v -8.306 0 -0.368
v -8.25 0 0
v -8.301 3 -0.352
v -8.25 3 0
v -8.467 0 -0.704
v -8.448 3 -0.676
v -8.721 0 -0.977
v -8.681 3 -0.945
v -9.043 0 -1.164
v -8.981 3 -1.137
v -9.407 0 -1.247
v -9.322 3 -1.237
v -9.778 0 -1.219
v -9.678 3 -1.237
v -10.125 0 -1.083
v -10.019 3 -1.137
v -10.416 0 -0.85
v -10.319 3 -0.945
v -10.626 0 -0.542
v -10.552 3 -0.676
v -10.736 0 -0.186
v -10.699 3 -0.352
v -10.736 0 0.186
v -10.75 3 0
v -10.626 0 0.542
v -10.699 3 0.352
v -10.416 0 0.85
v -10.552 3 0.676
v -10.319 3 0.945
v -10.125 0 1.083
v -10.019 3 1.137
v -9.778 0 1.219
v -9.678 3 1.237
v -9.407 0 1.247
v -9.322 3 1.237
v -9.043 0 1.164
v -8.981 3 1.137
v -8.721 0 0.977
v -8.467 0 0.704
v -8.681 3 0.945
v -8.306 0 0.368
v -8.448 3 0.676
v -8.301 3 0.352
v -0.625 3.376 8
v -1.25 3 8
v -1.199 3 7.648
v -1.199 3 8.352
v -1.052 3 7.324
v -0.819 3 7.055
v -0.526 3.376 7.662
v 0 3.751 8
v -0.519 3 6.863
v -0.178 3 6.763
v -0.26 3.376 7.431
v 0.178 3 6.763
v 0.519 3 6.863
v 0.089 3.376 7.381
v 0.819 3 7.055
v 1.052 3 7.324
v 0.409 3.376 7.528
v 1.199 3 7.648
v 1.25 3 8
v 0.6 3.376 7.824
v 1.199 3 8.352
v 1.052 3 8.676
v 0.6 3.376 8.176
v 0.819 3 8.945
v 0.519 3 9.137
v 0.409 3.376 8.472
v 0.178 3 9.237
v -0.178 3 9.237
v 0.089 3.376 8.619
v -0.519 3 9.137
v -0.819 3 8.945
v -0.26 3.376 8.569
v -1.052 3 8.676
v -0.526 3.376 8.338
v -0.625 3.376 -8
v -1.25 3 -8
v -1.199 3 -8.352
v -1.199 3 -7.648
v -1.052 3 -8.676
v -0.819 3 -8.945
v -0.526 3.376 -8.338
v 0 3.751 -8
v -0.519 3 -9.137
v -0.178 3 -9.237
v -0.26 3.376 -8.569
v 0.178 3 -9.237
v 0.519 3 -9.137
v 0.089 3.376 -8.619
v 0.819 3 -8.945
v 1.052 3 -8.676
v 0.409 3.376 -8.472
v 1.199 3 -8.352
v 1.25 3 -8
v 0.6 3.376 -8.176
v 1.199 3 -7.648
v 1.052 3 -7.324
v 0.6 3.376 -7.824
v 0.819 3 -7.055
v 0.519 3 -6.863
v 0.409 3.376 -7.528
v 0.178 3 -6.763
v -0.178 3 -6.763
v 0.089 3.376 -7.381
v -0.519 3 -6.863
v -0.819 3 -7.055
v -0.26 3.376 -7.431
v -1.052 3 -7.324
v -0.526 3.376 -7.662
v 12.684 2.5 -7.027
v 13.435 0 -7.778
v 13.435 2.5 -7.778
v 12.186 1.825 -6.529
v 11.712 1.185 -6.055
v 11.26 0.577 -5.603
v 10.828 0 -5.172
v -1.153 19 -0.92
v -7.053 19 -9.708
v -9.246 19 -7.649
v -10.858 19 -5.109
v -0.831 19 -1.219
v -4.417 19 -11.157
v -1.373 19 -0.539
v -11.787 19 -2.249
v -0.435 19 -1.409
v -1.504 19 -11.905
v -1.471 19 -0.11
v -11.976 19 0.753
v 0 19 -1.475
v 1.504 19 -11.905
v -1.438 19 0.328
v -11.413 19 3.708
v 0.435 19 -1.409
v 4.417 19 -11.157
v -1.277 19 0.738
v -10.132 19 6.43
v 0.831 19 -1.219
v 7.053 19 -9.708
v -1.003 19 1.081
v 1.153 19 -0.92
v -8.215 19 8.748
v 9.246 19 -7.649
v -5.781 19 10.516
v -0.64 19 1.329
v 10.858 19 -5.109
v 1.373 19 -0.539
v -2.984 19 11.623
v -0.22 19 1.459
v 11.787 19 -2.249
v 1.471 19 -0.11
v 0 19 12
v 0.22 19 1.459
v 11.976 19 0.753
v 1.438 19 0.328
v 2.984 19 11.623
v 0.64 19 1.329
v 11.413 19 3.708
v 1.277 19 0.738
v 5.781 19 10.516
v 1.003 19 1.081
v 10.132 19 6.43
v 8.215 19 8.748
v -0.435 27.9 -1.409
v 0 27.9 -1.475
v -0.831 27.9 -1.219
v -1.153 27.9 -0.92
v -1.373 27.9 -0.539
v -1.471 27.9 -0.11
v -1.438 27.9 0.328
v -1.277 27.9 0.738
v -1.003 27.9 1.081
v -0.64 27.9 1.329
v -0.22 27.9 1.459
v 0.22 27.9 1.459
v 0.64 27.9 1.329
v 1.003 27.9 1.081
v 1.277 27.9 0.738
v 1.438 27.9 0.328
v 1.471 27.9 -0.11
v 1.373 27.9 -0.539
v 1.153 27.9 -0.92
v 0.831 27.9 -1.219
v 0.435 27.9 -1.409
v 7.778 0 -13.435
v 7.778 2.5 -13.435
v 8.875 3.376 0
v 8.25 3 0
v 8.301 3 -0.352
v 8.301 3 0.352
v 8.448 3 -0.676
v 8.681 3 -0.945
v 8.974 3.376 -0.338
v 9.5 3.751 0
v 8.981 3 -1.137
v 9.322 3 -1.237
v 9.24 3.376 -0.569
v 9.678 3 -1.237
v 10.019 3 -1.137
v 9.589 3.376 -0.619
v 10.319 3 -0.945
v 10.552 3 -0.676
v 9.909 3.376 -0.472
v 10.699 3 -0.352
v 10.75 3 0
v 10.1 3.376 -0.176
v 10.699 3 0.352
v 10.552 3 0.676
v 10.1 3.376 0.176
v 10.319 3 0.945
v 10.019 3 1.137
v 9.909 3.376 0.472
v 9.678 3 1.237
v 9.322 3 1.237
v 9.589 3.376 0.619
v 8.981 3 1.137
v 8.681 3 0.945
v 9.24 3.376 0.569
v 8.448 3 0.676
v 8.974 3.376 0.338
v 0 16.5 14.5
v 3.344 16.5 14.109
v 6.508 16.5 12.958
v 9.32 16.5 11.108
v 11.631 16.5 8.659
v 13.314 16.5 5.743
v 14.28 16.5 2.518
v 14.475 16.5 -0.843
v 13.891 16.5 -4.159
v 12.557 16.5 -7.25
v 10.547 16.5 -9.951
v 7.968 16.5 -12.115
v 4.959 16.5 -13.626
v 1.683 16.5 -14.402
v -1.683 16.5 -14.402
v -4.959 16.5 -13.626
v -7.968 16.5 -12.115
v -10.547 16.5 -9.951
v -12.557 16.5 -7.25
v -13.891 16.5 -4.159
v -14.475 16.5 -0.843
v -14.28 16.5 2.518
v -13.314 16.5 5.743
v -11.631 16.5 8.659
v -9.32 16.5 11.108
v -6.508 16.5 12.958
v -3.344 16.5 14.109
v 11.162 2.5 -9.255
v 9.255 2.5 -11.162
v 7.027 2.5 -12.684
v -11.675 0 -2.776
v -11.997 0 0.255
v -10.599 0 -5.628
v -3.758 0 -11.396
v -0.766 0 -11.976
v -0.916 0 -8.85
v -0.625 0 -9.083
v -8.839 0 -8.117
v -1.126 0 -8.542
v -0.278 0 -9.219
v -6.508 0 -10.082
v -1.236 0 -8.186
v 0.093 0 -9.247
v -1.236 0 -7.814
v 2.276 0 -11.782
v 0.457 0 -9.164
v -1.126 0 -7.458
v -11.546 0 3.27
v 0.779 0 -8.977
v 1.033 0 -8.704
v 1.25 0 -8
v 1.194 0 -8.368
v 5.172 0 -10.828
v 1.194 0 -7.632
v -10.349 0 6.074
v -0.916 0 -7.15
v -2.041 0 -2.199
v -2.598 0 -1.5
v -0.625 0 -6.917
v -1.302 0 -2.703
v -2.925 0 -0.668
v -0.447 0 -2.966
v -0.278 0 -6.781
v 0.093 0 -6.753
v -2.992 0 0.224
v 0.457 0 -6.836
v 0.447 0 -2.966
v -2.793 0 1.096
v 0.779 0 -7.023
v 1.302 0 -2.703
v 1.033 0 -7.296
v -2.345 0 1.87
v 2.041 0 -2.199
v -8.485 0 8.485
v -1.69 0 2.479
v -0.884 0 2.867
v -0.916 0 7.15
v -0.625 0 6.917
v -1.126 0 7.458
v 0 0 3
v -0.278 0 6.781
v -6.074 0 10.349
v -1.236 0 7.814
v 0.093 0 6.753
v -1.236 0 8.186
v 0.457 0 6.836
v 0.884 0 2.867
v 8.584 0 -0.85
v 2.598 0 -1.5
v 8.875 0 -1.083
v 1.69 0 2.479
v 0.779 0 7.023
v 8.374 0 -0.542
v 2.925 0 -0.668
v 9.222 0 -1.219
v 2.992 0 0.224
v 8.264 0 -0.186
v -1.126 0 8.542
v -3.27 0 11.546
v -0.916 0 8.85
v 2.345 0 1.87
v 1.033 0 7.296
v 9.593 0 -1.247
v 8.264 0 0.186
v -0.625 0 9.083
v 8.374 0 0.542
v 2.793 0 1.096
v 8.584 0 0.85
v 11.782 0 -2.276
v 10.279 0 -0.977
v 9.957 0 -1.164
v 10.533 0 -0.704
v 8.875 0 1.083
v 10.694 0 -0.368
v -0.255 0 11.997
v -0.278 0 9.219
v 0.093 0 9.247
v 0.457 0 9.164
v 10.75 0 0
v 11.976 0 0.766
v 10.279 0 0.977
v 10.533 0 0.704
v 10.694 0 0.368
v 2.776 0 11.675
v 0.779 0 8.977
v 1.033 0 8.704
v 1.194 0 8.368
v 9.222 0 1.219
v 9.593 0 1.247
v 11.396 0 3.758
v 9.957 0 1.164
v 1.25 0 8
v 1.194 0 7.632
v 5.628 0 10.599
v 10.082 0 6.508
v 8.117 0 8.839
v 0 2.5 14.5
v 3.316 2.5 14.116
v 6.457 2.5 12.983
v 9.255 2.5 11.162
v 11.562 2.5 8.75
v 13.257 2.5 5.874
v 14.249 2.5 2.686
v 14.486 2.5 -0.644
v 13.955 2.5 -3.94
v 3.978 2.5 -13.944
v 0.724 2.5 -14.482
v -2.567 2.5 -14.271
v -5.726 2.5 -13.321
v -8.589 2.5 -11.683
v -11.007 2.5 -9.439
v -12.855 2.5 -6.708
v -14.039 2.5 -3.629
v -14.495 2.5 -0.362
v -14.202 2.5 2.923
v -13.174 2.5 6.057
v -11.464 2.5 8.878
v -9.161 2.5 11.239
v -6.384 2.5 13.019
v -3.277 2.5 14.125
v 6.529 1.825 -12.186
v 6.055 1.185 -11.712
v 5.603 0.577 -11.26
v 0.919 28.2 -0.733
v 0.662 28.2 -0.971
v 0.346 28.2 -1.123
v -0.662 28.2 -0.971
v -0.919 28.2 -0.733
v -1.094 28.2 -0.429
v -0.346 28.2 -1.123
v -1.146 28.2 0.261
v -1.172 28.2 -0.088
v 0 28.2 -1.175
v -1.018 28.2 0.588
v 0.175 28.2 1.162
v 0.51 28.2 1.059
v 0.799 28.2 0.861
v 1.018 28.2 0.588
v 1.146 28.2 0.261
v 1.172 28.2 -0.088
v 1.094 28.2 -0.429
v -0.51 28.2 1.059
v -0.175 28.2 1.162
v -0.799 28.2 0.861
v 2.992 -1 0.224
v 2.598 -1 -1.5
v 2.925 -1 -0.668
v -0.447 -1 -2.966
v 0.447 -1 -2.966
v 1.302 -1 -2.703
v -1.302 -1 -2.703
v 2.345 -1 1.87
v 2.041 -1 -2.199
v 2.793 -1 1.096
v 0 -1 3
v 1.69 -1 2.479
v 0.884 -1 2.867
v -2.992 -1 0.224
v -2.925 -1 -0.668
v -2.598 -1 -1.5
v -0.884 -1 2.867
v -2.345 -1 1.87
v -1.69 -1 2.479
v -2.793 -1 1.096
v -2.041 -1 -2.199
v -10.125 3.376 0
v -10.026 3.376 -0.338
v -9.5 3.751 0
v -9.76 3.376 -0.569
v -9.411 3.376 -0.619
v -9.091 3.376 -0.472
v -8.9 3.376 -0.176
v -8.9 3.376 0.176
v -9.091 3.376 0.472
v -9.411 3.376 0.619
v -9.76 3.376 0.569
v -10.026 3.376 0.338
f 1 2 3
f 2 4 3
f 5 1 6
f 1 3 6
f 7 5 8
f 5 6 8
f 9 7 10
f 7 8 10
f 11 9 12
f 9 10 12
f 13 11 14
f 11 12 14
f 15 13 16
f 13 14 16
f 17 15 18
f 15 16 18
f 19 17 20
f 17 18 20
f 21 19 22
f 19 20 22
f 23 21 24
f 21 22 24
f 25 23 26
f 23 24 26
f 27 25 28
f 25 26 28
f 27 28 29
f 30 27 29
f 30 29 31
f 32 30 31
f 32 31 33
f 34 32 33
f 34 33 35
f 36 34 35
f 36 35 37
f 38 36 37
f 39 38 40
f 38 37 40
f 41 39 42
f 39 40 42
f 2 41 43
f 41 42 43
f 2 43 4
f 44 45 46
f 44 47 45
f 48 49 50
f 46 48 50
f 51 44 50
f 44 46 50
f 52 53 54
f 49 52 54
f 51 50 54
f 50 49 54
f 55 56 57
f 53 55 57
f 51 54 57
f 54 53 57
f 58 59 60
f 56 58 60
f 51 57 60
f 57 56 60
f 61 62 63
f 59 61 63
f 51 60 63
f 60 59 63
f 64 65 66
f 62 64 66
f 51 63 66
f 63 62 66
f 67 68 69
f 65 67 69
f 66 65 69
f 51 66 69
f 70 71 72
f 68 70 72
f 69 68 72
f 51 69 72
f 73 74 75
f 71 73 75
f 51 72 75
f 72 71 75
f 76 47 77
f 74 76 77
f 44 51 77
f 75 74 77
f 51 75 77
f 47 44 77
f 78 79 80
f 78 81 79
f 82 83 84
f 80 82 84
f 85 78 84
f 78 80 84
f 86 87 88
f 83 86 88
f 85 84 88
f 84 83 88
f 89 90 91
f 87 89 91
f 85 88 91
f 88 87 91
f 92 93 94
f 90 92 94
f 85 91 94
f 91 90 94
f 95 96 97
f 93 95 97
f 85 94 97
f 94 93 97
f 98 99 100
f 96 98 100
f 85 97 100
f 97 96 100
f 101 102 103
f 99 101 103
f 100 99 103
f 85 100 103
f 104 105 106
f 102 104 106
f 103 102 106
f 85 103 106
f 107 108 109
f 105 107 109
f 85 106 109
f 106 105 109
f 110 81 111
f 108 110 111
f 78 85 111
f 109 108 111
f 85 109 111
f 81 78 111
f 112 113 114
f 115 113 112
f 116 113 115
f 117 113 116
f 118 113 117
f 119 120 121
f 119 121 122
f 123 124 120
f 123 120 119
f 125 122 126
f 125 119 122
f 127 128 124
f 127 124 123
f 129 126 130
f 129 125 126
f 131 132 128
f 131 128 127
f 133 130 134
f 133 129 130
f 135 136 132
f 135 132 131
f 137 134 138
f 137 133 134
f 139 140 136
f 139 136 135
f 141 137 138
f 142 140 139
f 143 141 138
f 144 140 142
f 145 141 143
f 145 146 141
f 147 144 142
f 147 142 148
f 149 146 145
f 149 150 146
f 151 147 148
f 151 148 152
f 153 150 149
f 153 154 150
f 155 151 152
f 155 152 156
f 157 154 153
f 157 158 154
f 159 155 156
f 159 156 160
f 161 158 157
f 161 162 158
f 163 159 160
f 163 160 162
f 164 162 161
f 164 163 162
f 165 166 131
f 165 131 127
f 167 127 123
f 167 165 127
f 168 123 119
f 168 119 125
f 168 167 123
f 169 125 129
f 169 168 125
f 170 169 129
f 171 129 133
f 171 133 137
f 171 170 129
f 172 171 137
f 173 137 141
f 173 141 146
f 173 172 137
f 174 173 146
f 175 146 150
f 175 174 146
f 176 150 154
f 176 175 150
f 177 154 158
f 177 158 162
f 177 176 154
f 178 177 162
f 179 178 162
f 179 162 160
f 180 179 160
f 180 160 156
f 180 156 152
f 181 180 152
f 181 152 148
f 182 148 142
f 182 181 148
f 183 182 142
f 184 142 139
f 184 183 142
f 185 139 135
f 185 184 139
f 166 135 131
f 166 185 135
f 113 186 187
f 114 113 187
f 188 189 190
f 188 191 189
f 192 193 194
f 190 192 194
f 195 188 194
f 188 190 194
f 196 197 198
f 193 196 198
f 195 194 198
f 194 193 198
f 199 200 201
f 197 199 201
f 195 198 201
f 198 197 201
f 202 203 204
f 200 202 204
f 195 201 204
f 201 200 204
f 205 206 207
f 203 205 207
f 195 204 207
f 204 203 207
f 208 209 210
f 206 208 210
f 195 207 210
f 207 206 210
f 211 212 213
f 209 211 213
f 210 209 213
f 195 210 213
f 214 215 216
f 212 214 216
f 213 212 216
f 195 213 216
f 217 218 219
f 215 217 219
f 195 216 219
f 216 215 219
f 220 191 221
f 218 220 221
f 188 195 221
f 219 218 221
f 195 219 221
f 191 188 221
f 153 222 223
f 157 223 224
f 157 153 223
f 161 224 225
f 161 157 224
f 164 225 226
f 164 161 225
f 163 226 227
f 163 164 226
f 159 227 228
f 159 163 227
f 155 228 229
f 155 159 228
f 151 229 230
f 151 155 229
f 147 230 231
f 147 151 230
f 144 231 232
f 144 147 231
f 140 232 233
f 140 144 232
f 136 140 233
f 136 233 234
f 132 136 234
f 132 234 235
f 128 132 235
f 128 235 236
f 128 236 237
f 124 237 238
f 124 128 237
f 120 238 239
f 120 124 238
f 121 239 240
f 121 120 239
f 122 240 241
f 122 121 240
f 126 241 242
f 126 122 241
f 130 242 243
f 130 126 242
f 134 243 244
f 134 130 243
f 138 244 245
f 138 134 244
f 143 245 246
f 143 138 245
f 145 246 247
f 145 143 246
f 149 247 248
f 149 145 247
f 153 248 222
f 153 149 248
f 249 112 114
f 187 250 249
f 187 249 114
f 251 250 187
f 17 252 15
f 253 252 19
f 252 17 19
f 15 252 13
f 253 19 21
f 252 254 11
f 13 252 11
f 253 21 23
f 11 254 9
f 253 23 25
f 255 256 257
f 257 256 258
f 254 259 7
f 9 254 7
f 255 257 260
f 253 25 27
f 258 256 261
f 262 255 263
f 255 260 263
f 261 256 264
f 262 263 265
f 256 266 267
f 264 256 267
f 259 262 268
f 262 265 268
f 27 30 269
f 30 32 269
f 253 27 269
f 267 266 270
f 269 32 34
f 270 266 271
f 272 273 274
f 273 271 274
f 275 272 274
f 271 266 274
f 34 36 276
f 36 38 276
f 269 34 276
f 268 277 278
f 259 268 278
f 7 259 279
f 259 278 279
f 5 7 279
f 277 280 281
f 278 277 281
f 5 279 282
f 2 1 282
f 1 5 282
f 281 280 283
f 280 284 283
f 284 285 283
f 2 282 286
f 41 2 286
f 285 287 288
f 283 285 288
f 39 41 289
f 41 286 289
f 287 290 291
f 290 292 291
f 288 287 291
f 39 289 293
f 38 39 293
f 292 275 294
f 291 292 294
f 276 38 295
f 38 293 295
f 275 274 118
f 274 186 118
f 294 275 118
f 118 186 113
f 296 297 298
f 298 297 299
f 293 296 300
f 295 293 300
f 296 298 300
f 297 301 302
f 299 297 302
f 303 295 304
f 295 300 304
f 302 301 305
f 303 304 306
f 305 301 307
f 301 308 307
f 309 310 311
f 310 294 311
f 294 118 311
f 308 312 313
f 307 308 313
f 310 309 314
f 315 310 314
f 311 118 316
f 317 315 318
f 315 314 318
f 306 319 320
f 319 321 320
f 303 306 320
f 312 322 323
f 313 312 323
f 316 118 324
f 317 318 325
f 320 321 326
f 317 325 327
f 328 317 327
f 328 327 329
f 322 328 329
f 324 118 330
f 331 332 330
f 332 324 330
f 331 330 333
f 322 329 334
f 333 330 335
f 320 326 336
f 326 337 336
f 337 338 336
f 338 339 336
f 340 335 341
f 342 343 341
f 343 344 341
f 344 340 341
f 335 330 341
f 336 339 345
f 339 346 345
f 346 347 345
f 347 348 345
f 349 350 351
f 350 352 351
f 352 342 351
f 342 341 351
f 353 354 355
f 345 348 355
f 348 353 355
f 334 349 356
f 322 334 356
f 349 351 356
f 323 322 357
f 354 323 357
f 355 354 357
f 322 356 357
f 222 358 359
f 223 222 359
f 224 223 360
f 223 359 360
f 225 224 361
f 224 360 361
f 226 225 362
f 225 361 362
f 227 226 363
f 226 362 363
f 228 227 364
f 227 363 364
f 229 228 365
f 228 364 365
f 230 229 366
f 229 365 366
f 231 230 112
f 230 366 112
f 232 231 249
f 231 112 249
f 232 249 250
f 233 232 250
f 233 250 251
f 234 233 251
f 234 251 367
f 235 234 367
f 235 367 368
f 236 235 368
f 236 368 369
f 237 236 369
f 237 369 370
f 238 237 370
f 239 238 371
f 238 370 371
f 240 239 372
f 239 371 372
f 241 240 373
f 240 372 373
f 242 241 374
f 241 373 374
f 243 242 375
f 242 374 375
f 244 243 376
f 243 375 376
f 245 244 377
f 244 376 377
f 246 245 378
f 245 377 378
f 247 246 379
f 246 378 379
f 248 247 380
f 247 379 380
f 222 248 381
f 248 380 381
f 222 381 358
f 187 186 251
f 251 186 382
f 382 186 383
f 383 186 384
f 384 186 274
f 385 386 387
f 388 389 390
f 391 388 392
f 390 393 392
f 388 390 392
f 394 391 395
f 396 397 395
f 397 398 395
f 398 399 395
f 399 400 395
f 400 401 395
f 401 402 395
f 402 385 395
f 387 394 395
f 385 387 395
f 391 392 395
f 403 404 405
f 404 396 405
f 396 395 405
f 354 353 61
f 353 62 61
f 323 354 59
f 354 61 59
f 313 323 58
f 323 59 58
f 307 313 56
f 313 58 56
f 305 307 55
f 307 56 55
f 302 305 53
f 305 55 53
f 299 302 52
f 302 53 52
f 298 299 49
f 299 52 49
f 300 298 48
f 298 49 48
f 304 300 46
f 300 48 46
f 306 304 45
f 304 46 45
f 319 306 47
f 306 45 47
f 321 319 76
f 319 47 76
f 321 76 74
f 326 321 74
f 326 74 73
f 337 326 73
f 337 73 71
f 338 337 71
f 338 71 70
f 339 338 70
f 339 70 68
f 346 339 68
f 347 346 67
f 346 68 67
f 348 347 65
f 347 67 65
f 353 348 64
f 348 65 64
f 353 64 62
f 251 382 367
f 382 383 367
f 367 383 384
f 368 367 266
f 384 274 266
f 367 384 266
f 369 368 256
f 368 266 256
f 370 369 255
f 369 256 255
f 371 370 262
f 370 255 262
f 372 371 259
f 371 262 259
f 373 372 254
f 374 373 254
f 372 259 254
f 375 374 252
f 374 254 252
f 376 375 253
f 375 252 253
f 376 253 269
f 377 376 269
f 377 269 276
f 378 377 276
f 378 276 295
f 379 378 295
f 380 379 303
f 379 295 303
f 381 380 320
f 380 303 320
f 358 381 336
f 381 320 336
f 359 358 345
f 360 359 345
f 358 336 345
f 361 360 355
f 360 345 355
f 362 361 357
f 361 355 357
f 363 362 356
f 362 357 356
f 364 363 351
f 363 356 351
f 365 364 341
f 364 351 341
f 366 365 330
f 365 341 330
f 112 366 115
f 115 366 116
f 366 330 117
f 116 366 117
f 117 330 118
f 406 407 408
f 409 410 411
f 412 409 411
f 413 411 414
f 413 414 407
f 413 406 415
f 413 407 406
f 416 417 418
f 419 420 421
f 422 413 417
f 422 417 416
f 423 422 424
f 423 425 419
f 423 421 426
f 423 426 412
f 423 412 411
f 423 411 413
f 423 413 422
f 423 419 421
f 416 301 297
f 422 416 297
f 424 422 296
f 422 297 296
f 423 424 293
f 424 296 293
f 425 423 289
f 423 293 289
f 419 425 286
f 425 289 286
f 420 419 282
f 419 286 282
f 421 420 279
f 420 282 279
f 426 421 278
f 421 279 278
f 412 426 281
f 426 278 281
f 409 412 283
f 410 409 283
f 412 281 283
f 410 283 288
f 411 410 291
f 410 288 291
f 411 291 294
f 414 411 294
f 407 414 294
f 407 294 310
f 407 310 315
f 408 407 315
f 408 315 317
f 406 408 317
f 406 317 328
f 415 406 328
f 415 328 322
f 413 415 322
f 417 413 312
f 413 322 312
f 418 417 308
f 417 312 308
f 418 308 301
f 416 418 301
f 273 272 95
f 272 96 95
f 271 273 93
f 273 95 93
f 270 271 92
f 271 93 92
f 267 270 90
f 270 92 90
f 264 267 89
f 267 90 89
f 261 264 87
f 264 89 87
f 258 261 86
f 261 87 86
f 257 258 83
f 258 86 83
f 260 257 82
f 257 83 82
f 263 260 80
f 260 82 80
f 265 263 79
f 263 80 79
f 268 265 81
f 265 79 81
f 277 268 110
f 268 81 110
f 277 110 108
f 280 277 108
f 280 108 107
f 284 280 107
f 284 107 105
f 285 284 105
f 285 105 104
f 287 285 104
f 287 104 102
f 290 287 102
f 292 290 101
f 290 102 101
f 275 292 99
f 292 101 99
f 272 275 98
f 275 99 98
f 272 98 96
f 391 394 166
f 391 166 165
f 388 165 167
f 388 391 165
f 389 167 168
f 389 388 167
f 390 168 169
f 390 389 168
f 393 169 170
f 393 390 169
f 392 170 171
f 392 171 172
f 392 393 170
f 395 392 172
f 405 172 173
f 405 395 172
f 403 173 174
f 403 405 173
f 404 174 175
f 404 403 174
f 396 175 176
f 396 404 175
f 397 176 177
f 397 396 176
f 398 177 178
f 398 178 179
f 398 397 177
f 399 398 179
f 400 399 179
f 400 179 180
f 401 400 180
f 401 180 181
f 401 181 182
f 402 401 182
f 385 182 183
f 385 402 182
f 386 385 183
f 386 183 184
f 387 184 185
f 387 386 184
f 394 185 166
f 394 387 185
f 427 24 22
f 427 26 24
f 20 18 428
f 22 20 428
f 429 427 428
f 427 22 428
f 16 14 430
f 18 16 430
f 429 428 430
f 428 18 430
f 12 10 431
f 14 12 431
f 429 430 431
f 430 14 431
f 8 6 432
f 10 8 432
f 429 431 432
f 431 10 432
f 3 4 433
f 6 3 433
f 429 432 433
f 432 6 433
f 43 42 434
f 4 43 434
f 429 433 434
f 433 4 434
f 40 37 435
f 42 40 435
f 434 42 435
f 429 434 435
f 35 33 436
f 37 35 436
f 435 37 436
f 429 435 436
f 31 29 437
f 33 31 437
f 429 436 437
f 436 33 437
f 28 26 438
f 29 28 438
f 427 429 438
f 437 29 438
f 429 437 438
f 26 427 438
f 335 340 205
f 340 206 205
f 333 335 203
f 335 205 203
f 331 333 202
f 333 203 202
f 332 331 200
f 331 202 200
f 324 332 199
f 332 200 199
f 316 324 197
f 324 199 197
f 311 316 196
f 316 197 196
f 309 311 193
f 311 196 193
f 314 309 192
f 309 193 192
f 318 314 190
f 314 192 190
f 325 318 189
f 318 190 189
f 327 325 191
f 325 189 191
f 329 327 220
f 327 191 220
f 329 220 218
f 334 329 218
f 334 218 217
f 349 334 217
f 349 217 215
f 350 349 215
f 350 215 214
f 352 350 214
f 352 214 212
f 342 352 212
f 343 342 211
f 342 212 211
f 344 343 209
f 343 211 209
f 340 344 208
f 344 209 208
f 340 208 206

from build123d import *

# Parameters (mm, degrees)
SKIZZE1_R                  = 14.5
GRUNDKOERPER_DEPTH         = 19
GRUNDKOERPERFASE_SIZE      = 2.5
MONTAGEBOHRUNG_UNTEN_D     = 2.5
MONTAGEBOHRUNG_UNTEN_DEPTH = 3
MONTAGEBOHRUNG_UNTEN_TIP   = 0.751075774
SKIZZE6_W                  = 1.475
SKIZZE6_H                  = 9.2
AUFNAHME_FASE_SIZE         = 0.3
SKIZZE7_R                  = 3
WELLENUEBERSTAND_DEPTH     = 1
SKIZZE8_W                  = 2.5
SKIZZE8_H                  = 8
KABELANSCHLUSS_DEPTH       = 5


with BuildPart() as part:
    # Skizze1 → Grundkoerper (new body)
    with BuildSketch(Plane(origin=(0, 0, 0), x_dir=(1, 0, 0), z_dir=(0, 1, 0))):
        Circle(SKIZZE1_R)
    extrude(amount=GRUNDKOERPER_DEPTH)

    # Grundkoerperfase
    grundkoerperfase_edges = [part.edges().sort_by_distance(p)[0] for p in [
        (-14.5, 0, 0),
        (-14.5, 19, 0),
    ]]
    chamfer(grundkoerperfase_edges, length=GRUNDKOERPERFASE_SIZE)

    # Montagebohrung unten
    with Locations(Plane(origin=(0, 0, 0), x_dir=(-1, 0, 0), z_dir=(0, -1, 0))):
        with Locations((9.5, 0), (0, -8), (-9.5, 0), (0, 8)):
            Hole(MONTAGEBOHRUNG_UNTEN_D / 2, depth=MONTAGEBOHRUNG_UNTEN_DEPTH)
            with Locations((0, 0, -(MONTAGEBOHRUNG_UNTEN_DEPTH + MONTAGEBOHRUNG_UNTEN_TIP / 2))):  # 118° drill point
                Cone(0, MONTAGEBOHRUNG_UNTEN_D / 2, MONTAGEBOHRUNG_UNTEN_TIP, mode=Mode.SUBTRACT)

    # Skizze6 → Propelleraufnahme (revolve)
    with BuildSketch(Plane.XY):
        with Locations((0.7375, 23.6)):
            Rectangle(SKIZZE6_W, SKIZZE6_H)
    revolve(axis=Axis((0, -3.27786324, 0), (0, 1, 0)))

    # Aufnahme_Fase
    aufnahme_fase_edges = [part.edges().sort_by_distance(p)[0] for p in [
        (-1.475, 28.2, 0),
    ]]
    chamfer(aufnahme_fase_edges, length=AUFNAHME_FASE_SIZE)

    # Skizze7 → Wellenueberstand (add)
    with BuildSketch(Plane.XZ):
        Circle(SKIZZE7_R)
    extrude(amount=WELLENUEBERSTAND_DEPTH)

    # Skizze8 → Kabelanschluss (add)
    with BuildSketch(Plane(origin=(7.071067812, 0, -7.071067812), x_dir=(0, 1, 0), z_dir=(-0.7071067811865488, 0, 0.7071067811865464))):
        with Locations((1.25, 0)):
            Rectangle(SKIZZE8_W, SKIZZE8_H)
    extrude(amount=-KABELANSCHLUSS_DEPTH)


solid = part.part
